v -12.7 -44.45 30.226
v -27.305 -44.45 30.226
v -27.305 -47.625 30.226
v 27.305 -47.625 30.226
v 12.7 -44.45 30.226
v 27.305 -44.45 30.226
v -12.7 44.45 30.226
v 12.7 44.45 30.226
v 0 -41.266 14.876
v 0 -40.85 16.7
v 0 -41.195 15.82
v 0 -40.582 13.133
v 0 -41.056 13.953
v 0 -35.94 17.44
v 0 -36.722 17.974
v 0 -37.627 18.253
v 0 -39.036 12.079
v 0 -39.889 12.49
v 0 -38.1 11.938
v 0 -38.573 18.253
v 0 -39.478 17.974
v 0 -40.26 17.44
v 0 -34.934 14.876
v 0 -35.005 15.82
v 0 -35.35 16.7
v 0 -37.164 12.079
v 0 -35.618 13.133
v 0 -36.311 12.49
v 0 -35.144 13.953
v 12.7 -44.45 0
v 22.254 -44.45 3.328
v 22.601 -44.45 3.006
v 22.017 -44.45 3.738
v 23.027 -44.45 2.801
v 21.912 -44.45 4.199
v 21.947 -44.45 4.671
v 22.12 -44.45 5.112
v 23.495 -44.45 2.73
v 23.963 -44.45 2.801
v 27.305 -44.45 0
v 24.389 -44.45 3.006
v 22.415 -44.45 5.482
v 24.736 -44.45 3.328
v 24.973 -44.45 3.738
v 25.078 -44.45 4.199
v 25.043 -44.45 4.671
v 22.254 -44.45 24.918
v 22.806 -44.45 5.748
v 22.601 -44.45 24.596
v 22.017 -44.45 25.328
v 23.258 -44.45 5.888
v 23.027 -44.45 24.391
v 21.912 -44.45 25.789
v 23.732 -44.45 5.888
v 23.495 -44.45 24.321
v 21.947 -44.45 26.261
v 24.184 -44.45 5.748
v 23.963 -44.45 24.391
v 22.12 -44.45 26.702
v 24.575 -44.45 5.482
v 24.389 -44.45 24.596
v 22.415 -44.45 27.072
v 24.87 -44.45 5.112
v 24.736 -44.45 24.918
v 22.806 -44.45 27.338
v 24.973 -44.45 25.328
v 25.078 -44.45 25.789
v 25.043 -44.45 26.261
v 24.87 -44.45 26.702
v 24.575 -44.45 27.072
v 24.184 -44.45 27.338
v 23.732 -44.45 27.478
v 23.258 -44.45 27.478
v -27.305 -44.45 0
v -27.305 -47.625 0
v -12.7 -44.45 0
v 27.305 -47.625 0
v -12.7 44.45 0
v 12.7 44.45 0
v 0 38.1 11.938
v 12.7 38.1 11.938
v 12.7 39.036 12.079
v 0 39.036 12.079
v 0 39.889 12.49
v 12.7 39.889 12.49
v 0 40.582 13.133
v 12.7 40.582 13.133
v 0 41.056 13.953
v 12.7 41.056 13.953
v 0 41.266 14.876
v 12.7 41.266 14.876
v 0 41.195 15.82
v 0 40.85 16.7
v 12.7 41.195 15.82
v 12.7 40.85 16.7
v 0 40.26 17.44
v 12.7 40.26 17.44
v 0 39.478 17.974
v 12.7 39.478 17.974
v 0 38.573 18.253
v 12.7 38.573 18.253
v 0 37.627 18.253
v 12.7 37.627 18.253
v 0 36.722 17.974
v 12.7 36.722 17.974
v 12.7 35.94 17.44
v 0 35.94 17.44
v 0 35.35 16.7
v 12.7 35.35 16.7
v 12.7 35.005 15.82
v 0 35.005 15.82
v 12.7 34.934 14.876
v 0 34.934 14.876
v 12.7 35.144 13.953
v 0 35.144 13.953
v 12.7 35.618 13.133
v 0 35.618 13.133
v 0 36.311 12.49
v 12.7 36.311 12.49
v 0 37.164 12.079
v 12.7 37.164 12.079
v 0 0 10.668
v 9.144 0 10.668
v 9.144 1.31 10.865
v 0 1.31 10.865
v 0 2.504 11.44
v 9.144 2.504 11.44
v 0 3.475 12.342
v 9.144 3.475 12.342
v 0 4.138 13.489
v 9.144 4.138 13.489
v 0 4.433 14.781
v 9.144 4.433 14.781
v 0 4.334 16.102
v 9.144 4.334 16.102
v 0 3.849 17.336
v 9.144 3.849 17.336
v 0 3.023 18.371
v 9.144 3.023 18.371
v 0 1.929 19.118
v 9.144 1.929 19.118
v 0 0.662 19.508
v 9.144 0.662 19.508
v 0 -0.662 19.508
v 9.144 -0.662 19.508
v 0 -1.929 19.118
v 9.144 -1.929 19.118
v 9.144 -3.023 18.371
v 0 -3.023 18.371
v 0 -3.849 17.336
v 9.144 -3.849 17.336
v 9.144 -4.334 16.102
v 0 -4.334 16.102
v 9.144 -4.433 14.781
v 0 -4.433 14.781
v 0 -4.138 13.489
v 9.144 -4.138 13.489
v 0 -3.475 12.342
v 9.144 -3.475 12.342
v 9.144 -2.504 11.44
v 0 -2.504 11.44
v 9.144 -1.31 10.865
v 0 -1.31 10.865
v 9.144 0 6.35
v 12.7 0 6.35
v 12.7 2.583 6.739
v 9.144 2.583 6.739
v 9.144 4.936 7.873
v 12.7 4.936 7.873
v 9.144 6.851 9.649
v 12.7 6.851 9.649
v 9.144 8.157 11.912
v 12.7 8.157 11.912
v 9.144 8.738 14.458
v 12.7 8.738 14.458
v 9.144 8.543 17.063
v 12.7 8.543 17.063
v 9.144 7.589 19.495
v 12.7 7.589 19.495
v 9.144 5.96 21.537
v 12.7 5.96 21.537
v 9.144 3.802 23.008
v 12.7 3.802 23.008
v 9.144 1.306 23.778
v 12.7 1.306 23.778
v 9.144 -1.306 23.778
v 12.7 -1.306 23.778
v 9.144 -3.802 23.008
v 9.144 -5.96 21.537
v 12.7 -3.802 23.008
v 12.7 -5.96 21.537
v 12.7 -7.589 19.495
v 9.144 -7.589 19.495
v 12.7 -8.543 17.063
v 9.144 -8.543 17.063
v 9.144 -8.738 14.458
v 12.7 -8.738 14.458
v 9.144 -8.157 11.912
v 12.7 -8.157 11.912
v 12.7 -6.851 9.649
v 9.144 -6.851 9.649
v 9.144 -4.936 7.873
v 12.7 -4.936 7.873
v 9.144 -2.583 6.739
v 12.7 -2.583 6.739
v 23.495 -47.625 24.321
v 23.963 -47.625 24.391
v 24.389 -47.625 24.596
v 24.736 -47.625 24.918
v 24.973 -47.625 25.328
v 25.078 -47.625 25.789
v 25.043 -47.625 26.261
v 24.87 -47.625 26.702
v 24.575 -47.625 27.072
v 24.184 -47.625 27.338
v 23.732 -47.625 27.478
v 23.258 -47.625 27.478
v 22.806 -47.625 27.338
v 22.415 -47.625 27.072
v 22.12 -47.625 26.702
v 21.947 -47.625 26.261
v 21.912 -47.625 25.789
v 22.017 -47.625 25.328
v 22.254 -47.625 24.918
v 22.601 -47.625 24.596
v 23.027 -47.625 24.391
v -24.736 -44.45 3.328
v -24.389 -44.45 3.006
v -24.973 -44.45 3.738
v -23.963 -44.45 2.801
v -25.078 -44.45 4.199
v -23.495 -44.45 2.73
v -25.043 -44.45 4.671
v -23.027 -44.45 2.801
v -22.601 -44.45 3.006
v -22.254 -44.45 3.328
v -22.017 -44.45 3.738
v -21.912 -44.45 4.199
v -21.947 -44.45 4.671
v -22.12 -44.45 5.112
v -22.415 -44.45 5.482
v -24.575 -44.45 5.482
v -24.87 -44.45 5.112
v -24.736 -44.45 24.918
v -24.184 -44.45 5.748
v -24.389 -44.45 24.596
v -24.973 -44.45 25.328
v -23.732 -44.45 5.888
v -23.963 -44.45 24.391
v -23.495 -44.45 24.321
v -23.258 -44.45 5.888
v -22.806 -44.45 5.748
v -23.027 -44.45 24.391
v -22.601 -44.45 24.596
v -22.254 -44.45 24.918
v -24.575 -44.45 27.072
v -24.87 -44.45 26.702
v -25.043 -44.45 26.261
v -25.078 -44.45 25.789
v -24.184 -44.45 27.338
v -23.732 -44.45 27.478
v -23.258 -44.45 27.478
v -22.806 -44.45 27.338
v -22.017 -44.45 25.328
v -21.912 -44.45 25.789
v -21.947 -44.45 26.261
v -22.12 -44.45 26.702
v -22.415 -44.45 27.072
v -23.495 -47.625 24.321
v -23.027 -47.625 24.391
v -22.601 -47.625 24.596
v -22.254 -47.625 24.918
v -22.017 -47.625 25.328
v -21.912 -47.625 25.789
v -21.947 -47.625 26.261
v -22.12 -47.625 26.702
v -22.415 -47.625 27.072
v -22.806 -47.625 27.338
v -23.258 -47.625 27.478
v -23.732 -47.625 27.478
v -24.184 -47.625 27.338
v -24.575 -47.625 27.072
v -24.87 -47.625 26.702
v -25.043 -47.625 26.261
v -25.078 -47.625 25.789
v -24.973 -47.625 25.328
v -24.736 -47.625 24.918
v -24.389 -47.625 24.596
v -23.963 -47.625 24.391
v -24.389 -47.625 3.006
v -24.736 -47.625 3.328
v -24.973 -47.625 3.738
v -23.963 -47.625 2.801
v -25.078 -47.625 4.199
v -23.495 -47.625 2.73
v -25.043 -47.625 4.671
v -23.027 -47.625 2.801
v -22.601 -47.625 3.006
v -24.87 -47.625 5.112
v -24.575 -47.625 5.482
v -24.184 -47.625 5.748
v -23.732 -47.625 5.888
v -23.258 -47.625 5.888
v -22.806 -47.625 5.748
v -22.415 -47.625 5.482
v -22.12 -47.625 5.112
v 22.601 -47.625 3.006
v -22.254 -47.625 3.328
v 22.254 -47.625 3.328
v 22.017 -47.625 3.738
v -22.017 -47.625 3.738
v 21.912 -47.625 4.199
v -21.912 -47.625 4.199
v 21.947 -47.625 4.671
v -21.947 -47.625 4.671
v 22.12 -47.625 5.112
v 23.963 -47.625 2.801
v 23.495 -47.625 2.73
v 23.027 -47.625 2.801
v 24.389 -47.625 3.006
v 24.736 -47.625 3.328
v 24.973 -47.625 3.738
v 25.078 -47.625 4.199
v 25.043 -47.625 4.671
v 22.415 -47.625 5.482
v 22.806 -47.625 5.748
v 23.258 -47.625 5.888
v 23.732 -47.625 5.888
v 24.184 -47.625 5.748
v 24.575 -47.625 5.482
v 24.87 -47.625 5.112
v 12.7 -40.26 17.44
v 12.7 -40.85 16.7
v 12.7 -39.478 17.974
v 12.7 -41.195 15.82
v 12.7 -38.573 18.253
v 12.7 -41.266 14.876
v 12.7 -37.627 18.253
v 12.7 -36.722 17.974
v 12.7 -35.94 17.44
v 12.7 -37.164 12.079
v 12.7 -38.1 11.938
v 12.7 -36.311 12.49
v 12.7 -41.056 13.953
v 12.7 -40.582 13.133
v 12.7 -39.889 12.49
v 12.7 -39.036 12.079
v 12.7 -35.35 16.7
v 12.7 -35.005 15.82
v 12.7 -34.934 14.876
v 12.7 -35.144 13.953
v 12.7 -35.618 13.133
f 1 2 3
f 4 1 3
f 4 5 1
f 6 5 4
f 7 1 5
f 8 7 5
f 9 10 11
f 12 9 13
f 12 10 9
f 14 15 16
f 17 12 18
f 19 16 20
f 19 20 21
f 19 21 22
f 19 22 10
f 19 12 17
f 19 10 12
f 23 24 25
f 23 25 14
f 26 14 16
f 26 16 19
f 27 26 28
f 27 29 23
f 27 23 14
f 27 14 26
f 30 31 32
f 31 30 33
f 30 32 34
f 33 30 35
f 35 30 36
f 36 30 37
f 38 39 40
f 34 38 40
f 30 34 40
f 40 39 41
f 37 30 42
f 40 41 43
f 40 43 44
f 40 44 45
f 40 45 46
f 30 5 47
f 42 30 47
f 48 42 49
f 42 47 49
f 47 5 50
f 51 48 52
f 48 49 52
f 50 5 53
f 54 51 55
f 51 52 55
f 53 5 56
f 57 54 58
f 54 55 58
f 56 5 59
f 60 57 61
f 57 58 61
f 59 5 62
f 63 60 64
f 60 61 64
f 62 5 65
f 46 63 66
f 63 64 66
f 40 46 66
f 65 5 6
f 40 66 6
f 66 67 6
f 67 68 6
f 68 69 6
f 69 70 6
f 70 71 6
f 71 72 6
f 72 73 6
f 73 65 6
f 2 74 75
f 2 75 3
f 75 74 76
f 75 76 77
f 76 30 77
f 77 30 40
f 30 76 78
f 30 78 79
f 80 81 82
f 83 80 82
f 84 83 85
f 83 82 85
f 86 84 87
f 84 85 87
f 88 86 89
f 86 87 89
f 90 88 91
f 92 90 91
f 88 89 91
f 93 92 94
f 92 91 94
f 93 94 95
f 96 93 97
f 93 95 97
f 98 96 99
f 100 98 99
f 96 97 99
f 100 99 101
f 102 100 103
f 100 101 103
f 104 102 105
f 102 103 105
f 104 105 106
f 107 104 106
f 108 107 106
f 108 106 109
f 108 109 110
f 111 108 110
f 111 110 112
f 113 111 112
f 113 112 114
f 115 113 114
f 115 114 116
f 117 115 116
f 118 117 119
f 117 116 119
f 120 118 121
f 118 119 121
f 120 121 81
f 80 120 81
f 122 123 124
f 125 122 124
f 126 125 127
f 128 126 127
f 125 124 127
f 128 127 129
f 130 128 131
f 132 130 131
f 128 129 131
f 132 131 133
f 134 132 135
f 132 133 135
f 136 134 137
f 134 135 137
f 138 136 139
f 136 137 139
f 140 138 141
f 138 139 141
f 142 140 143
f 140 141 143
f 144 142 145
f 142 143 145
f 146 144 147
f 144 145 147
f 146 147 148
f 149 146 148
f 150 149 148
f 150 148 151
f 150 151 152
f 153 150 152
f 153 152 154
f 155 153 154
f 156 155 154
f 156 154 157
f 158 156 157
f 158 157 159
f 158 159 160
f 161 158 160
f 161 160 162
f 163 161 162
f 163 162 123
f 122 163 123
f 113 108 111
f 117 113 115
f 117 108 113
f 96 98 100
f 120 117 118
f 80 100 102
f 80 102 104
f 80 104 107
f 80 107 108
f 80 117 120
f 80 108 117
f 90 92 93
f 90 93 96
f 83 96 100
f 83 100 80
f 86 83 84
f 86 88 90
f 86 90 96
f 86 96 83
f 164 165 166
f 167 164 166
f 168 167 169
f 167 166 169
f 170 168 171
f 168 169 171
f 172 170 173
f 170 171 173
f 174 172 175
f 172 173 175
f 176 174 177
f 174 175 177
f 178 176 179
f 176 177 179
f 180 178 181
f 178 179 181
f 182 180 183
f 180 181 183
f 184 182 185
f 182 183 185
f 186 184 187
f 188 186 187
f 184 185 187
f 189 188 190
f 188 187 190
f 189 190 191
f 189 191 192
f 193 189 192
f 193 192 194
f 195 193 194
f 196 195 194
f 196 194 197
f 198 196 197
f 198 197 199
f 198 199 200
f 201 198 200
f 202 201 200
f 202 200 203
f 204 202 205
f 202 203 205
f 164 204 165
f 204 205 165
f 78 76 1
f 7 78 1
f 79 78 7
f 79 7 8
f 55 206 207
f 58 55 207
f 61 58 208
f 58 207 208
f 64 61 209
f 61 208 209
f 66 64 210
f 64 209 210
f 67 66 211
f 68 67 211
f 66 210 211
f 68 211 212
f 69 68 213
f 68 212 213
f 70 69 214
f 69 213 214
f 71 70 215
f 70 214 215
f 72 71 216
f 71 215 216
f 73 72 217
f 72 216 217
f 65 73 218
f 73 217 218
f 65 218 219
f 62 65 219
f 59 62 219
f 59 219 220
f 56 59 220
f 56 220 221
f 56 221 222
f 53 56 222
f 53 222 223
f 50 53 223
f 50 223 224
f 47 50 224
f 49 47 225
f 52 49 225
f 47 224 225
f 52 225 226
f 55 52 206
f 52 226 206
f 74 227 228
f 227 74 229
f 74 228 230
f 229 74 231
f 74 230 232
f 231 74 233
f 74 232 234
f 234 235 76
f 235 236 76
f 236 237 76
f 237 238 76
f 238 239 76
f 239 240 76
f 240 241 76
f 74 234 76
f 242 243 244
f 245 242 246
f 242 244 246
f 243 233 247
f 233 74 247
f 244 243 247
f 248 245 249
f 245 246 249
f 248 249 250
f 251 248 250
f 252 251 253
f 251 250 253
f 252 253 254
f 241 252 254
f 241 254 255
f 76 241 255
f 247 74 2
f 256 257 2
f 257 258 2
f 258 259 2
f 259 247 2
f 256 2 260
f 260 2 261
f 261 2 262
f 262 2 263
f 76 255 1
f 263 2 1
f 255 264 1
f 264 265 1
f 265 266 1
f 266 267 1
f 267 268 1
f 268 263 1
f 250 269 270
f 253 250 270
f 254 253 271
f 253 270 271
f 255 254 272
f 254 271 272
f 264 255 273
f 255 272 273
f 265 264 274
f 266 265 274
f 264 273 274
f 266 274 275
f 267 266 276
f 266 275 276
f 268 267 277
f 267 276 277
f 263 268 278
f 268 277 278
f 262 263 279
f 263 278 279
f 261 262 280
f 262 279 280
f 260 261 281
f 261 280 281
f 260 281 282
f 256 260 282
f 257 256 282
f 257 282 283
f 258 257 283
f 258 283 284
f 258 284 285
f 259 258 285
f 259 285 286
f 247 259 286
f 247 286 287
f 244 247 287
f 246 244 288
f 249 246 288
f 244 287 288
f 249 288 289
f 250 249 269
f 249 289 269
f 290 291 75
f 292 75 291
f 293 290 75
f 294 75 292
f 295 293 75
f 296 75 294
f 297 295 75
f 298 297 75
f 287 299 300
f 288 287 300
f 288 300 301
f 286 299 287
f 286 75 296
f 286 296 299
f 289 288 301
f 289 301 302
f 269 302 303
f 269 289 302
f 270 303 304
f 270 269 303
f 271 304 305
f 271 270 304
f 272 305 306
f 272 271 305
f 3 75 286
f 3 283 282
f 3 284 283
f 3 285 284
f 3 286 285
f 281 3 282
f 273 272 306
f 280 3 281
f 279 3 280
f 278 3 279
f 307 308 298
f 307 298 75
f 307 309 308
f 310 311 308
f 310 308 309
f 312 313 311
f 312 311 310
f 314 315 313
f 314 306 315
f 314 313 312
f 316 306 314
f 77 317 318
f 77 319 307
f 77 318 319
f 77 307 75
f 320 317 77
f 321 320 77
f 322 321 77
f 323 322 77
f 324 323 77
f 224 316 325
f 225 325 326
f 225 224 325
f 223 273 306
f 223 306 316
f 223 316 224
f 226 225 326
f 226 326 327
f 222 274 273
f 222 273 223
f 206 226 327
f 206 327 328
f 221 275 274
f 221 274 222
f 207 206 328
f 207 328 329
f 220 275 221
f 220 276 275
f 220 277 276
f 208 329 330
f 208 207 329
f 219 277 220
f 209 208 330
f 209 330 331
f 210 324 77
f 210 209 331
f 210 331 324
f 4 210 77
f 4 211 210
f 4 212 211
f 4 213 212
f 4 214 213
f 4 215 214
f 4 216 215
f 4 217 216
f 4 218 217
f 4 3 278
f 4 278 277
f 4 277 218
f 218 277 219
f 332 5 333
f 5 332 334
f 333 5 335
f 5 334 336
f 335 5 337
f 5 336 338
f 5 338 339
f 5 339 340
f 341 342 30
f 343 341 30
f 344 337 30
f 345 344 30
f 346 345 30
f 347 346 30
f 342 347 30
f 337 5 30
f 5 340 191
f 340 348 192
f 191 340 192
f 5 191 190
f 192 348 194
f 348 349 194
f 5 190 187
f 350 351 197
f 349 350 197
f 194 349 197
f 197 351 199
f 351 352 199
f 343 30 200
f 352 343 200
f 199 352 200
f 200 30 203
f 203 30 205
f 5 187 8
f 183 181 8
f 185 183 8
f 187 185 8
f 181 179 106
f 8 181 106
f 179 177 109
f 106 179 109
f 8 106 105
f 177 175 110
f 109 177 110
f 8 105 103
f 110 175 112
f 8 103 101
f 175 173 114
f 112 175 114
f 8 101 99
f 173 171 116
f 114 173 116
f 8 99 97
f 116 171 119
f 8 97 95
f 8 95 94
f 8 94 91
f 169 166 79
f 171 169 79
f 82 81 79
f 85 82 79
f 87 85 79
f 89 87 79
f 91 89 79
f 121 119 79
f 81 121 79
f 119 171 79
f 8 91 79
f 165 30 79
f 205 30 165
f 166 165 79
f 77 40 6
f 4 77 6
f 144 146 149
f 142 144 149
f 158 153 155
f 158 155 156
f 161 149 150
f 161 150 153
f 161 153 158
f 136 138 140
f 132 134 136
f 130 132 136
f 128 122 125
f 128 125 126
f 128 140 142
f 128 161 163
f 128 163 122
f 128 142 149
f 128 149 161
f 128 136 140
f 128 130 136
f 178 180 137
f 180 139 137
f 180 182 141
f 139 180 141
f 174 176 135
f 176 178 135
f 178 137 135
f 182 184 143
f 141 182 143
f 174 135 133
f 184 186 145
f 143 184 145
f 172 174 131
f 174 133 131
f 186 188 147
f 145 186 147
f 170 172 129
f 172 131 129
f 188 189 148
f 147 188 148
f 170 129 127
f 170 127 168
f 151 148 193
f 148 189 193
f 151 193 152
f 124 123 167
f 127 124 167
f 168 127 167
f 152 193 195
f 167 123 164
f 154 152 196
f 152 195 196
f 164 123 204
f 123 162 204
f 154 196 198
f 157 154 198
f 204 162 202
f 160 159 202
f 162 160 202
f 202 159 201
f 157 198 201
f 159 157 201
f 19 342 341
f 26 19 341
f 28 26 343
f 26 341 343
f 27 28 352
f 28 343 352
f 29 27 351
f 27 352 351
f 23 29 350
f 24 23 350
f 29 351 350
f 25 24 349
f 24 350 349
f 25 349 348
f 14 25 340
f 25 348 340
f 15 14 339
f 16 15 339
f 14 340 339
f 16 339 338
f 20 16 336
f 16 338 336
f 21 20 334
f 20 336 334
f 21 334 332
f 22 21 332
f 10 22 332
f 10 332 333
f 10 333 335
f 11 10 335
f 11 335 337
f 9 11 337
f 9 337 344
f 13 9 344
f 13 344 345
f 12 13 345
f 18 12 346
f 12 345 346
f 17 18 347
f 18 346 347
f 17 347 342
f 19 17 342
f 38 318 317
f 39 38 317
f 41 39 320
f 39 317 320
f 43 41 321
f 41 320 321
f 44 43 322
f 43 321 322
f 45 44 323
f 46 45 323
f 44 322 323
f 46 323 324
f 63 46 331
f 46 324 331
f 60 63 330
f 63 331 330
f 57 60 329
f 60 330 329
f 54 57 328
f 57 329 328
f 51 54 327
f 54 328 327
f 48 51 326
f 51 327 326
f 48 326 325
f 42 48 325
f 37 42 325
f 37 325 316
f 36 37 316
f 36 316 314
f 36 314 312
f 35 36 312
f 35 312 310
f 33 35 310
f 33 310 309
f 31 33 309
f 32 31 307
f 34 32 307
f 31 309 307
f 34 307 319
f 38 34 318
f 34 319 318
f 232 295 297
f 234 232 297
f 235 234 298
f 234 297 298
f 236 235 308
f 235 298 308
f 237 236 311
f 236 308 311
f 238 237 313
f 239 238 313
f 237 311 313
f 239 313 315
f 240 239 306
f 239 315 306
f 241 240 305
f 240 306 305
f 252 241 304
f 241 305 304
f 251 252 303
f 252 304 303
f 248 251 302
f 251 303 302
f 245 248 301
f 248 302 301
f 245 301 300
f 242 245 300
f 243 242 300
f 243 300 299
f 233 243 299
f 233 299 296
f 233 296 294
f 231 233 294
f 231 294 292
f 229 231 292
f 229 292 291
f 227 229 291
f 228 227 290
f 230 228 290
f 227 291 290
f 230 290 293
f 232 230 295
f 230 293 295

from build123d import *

# Parameters (mm, degrees)
SKETCH1_W           = 25.4
SKETCH1_H           = 88.9
BOSS_EXTRUDE1_DEPTH = 30.226
SKETCH2_R           = 3.175
CUT_EXTRUDE1_DEPTH  = 12.7
SKETCH3_R           = 8.763
CUT_EXTRUDE2_DEPTH  = 3.556
CUT_EXTRUDE3_START  = -21.844
SKETCH4_R           = 10.795
CUT_EXTRUDE3_DEPTH  = 21.844
SKETCH5_W           = 54.61
SKETCH5_H           = 30.226
BOSS_EXTRUDE2_DEPTH = 3.175
SKETCH6_R           = 1.5875
CUT_EXTRUDE4_DEPTH  = 3.175
BOSS_EXTRUDE3_START = 2.54
SKETCH8_R           = 10.795
SKETCH8_R_2         = 6.35
BOSS_EXTRUDE3_DEPTH = 2.54
BOSS_EXTRUDE4_START = 19.304
SKETCH9_R           = 10.795
BOSS_EXTRUDE4_DEPTH = 19.304
SKETCH10_R          = 8.763
BOSS_EXTRUDE5_DEPTH = 10.16
SKETCH12_R          = 4.445
CUT_EXTRUDE5_DEPTH  = 12.7


with BuildPart() as part:
    # Sketch1 → Boss-Extrude1 (new body)
    with BuildSketch(Plane.XY):
        Rectangle(SKETCH1_W, SKETCH1_H)
    extrude(amount=BOSS_EXTRUDE1_DEPTH)

    # Sketch2 → Cut-Extrude1 (cut)
    with BuildSketch(Plane(origin=(12.7, 0, 0), x_dir=(0, 0, -1), z_dir=(1, 0, 0))):
        with Locations((-15.113, 38.1)):
            Circle(SKETCH2_R)
        with Locations((-15.113, -38.1)):
            Circle(SKETCH2_R)
    extrude(amount=-CUT_EXTRUDE1_DEPTH, mode=Mode.SUBTRACT)

    # Sketch3 → Cut-Extrude2 (cut)
    with BuildSketch(Plane(origin=(12.7, 0, 0), x_dir=(0, 0, -1), z_dir=(1, 0, 0))):
        with Locations((-15.113, 0)):
            Circle(SKETCH3_R)
    extrude(amount=-CUT_EXTRUDE2_DEPTH, mode=Mode.SUBTRACT)

    # Sketch4 → Cut-Extrude3 (cut)
    with BuildSketch(Plane(origin=(9.144, 0, 0), x_dir=(0, 0, -1), z_dir=(1, 0, 0)).offset(CUT_EXTRUDE3_START)):
        with Locations((-15.113, 0)):
            Circle(SKETCH4_R)
    extrude(amount=CUT_EXTRUDE3_DEPTH, mode=Mode.SUBTRACT)

    # Sketch5 → Boss-Extrude2 (add)
    with BuildSketch(Plane.XZ.offset(44.45)):
        with Locations((0, 15.113)):
            Rectangle(SKETCH5_W, SKETCH5_H)
    extrude(amount=BOSS_EXTRUDE2_DEPTH)

    # Sketch6 → Cut-Extrude4 (cut)
    with BuildSketch(Plane.XZ.offset(47.625)):
        with Locations(Location((-23.495, 25.908, 0), (0, 0, 270))):
            Circle(SKETCH6_R)
        with Locations(Location((-23.495, 4.318, 0), (0, 0, 270))):
            Circle(SKETCH6_R)
        with Locations(Location((23.495, 4.318, 0), (0, 0, 270))):
            Circle(SKETCH6_R)
        with Locations(Location((23.495, 25.908, 0), (0, 0, 270))):
            Circle(SKETCH6_R)
    extrude(amount=-CUT_EXTRUDE4_DEPTH, mode=Mode.SUBTRACT)

    # Sketch8 → Boss-Extrude3 (add)
    with BuildSketch(Plane.ZY.offset(-9.144).offset(BOSS_EXTRUDE3_START)):
        with Locations(Location((15.113, 0, 0), (0, 0, 180))):
            Circle(SKETCH8_R)
        with Locations((15.113, 0)):
            Circle(SKETCH8_R_2, mode=Mode.SUBTRACT)
    extrude(amount=-BOSS_EXTRUDE3_DEPTH)

    # Sketch9 → Boss-Extrude4 (add)
    with BuildSketch(Plane.ZY.offset(-6.604).offset(BOSS_EXTRUDE4_START)):
        with Locations((15.113, 0)):
            Circle(SKETCH9_R)
    extrude(amount=-BOSS_EXTRUDE4_DEPTH)

    # Sketch10 → Boss-Extrude5 (add)
    with BuildSketch(Plane(origin=(9.144, 0, 0), x_dir=(0, 0, -1), z_dir=(1, 0, 0))):
        with Locations((-15.113, 0)):
            Circle(SKETCH10_R)
    extrude(amount=-BOSS_EXTRUDE5_DEPTH)

    # Sketch12 → Cut-Extrude5 (cut)
    with BuildSketch(Plane(origin=(12.7, 0, 0), x_dir=(0, 0, -1), z_dir=(1, 0, 0))):
        with Locations((-15.113, 0)):
            Circle(SKETCH12_R)
    extrude(amount=-CUT_EXTRUDE5_DEPTH, mode=Mode.SUBTRACT)


solid = part.part
